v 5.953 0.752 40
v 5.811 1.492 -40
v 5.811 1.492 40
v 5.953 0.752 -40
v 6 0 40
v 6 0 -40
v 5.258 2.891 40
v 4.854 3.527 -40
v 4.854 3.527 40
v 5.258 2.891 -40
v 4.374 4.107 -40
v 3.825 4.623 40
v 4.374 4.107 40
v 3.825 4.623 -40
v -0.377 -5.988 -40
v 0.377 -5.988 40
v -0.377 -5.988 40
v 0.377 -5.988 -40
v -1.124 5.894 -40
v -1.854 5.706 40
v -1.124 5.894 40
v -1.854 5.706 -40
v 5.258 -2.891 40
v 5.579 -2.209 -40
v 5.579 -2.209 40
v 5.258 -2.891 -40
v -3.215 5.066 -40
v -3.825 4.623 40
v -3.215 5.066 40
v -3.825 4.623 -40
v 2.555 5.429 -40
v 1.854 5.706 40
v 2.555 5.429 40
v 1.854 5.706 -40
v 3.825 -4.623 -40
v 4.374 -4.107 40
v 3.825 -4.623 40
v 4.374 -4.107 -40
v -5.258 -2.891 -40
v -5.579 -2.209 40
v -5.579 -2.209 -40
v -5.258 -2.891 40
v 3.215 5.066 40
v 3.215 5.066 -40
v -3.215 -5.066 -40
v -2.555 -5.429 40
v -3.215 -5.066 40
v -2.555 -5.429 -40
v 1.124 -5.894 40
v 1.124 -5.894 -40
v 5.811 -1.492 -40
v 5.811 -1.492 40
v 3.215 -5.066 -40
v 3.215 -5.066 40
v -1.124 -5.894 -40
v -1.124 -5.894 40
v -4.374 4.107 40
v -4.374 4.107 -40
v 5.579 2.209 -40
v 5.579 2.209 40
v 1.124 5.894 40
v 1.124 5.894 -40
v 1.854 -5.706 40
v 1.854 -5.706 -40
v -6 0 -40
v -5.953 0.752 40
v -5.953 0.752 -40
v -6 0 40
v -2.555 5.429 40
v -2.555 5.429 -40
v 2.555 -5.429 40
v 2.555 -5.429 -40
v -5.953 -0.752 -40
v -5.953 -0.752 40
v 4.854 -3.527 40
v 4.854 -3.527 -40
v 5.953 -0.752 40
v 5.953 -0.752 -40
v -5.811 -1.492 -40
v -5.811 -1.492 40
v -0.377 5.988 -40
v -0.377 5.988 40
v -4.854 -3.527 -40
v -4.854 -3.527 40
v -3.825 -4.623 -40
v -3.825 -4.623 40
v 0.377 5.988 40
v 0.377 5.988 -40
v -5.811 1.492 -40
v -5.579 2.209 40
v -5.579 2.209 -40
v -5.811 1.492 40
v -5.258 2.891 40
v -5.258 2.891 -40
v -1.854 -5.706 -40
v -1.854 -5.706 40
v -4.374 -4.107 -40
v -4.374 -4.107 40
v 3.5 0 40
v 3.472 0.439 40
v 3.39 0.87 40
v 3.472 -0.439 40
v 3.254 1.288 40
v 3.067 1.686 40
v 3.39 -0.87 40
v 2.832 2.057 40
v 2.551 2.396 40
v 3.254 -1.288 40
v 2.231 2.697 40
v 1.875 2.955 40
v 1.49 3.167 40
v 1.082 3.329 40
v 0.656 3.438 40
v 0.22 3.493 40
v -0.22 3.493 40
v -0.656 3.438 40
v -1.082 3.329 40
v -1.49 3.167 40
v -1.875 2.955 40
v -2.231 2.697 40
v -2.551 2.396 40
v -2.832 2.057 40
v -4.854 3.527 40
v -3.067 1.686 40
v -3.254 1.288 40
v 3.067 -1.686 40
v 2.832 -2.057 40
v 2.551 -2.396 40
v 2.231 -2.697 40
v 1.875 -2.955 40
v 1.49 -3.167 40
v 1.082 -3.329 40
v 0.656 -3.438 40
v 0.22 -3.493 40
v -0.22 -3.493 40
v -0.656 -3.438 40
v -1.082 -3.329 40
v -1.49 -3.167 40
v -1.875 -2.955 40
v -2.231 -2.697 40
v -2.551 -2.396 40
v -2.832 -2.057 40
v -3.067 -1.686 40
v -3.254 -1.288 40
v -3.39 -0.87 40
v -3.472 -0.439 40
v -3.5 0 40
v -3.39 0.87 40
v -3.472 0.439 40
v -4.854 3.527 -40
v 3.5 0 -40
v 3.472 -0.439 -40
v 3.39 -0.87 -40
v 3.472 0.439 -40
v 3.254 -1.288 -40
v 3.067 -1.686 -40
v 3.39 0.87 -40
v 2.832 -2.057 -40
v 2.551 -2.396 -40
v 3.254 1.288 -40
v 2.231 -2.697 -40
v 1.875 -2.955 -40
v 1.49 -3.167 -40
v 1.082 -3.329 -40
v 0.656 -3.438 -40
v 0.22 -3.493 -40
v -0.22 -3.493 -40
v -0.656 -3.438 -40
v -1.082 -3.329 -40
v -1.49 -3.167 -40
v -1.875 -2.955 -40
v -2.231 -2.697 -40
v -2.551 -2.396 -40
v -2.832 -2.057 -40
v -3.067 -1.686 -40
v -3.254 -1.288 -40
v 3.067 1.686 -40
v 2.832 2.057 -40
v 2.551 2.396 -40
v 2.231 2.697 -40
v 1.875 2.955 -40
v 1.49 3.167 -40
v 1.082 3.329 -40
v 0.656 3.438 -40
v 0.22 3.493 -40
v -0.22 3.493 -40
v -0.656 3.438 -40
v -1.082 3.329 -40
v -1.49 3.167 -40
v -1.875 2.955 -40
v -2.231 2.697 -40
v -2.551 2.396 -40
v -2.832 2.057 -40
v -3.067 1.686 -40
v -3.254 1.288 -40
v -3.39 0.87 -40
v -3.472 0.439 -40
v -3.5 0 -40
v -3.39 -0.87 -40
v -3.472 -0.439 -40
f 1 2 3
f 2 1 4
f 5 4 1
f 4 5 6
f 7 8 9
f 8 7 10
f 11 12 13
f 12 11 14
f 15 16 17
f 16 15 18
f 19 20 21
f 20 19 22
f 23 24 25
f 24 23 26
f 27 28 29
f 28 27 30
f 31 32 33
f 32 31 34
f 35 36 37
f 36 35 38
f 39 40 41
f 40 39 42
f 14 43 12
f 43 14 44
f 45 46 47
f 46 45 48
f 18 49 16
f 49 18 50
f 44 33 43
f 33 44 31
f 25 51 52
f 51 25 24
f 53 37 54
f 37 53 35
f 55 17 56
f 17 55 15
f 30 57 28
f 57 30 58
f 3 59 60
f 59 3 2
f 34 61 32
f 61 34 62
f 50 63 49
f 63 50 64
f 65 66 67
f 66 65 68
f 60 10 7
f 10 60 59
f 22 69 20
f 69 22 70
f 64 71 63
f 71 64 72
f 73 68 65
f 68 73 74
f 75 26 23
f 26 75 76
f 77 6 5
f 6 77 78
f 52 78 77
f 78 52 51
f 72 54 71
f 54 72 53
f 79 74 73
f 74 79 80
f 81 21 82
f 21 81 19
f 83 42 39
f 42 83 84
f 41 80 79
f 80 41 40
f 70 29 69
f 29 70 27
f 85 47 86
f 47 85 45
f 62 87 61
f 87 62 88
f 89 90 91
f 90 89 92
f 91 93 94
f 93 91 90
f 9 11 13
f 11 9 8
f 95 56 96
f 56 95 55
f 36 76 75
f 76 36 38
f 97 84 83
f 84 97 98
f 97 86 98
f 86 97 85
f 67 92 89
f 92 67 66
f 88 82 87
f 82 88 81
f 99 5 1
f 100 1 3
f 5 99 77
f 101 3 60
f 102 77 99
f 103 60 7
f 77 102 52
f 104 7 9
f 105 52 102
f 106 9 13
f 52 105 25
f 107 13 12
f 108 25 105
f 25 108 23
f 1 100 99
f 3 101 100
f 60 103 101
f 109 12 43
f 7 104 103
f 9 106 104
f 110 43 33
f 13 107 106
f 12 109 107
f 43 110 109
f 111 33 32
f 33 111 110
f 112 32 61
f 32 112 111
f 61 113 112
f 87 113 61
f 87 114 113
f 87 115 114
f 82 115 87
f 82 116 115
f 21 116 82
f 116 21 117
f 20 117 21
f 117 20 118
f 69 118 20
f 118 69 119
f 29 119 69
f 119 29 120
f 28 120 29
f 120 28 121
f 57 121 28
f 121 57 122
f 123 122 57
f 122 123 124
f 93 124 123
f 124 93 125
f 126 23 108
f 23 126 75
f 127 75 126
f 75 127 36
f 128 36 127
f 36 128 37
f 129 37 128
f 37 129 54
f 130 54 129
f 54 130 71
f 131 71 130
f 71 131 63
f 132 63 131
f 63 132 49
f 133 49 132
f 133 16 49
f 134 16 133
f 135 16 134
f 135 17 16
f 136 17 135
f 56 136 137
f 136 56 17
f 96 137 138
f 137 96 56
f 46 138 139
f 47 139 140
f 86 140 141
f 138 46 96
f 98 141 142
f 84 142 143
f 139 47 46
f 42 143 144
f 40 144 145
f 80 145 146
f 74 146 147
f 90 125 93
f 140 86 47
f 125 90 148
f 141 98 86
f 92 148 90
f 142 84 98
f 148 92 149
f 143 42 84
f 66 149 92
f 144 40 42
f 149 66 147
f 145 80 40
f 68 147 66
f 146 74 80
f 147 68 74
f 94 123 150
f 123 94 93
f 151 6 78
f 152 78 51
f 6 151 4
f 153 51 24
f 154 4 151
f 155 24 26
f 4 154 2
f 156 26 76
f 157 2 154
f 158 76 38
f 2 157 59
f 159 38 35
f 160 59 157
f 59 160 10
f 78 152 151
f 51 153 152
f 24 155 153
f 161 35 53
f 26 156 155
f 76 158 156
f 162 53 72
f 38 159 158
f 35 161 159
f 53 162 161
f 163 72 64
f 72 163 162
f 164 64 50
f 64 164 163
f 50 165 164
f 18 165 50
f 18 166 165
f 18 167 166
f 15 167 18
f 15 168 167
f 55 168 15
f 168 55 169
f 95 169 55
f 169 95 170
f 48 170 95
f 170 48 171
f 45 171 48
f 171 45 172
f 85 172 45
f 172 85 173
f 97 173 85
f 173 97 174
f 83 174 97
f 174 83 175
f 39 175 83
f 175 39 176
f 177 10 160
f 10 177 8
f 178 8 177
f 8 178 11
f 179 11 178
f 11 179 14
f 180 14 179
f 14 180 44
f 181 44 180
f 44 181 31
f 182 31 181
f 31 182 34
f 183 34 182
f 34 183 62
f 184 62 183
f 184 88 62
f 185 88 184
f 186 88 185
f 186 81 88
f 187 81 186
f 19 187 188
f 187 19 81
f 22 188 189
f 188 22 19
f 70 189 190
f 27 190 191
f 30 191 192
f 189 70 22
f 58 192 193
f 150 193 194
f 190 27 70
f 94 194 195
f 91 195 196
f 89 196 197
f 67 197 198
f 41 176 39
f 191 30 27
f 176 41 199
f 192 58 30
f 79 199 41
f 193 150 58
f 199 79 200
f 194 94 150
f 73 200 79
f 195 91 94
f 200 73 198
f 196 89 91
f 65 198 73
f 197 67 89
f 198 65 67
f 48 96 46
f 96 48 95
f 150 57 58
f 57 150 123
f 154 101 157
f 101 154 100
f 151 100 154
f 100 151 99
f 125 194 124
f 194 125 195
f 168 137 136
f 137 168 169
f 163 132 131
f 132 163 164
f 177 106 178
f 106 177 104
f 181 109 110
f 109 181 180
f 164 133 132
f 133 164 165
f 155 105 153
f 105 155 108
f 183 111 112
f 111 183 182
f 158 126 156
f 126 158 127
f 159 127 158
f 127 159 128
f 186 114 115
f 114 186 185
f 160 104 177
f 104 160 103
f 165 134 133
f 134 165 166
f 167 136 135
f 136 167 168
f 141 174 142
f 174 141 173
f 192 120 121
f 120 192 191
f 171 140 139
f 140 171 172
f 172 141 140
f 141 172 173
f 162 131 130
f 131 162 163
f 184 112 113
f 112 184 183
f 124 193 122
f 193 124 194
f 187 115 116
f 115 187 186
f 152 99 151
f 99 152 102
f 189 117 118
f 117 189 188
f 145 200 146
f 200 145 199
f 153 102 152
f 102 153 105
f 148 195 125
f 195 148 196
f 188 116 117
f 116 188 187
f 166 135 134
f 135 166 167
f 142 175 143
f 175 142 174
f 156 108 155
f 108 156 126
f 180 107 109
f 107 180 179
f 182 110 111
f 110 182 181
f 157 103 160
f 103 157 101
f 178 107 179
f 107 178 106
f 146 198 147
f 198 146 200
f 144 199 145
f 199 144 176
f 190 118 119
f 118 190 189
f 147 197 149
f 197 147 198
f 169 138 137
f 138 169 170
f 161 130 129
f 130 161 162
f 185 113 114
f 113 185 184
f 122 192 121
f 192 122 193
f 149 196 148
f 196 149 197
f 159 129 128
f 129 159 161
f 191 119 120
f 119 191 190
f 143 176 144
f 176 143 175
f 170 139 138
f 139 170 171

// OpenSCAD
$fn = 50;


difference() {
	union() {
		translate(v = [0, 0, -40.0000000000]) {
			cylinder(h = 80, r = 6.0000000000);
		}
	}
	union() {
		translate(v = [0, 0, -100.0000000000]) {
			cylinder(h = 200, r = 3.5000000000);
		}
	}
}
